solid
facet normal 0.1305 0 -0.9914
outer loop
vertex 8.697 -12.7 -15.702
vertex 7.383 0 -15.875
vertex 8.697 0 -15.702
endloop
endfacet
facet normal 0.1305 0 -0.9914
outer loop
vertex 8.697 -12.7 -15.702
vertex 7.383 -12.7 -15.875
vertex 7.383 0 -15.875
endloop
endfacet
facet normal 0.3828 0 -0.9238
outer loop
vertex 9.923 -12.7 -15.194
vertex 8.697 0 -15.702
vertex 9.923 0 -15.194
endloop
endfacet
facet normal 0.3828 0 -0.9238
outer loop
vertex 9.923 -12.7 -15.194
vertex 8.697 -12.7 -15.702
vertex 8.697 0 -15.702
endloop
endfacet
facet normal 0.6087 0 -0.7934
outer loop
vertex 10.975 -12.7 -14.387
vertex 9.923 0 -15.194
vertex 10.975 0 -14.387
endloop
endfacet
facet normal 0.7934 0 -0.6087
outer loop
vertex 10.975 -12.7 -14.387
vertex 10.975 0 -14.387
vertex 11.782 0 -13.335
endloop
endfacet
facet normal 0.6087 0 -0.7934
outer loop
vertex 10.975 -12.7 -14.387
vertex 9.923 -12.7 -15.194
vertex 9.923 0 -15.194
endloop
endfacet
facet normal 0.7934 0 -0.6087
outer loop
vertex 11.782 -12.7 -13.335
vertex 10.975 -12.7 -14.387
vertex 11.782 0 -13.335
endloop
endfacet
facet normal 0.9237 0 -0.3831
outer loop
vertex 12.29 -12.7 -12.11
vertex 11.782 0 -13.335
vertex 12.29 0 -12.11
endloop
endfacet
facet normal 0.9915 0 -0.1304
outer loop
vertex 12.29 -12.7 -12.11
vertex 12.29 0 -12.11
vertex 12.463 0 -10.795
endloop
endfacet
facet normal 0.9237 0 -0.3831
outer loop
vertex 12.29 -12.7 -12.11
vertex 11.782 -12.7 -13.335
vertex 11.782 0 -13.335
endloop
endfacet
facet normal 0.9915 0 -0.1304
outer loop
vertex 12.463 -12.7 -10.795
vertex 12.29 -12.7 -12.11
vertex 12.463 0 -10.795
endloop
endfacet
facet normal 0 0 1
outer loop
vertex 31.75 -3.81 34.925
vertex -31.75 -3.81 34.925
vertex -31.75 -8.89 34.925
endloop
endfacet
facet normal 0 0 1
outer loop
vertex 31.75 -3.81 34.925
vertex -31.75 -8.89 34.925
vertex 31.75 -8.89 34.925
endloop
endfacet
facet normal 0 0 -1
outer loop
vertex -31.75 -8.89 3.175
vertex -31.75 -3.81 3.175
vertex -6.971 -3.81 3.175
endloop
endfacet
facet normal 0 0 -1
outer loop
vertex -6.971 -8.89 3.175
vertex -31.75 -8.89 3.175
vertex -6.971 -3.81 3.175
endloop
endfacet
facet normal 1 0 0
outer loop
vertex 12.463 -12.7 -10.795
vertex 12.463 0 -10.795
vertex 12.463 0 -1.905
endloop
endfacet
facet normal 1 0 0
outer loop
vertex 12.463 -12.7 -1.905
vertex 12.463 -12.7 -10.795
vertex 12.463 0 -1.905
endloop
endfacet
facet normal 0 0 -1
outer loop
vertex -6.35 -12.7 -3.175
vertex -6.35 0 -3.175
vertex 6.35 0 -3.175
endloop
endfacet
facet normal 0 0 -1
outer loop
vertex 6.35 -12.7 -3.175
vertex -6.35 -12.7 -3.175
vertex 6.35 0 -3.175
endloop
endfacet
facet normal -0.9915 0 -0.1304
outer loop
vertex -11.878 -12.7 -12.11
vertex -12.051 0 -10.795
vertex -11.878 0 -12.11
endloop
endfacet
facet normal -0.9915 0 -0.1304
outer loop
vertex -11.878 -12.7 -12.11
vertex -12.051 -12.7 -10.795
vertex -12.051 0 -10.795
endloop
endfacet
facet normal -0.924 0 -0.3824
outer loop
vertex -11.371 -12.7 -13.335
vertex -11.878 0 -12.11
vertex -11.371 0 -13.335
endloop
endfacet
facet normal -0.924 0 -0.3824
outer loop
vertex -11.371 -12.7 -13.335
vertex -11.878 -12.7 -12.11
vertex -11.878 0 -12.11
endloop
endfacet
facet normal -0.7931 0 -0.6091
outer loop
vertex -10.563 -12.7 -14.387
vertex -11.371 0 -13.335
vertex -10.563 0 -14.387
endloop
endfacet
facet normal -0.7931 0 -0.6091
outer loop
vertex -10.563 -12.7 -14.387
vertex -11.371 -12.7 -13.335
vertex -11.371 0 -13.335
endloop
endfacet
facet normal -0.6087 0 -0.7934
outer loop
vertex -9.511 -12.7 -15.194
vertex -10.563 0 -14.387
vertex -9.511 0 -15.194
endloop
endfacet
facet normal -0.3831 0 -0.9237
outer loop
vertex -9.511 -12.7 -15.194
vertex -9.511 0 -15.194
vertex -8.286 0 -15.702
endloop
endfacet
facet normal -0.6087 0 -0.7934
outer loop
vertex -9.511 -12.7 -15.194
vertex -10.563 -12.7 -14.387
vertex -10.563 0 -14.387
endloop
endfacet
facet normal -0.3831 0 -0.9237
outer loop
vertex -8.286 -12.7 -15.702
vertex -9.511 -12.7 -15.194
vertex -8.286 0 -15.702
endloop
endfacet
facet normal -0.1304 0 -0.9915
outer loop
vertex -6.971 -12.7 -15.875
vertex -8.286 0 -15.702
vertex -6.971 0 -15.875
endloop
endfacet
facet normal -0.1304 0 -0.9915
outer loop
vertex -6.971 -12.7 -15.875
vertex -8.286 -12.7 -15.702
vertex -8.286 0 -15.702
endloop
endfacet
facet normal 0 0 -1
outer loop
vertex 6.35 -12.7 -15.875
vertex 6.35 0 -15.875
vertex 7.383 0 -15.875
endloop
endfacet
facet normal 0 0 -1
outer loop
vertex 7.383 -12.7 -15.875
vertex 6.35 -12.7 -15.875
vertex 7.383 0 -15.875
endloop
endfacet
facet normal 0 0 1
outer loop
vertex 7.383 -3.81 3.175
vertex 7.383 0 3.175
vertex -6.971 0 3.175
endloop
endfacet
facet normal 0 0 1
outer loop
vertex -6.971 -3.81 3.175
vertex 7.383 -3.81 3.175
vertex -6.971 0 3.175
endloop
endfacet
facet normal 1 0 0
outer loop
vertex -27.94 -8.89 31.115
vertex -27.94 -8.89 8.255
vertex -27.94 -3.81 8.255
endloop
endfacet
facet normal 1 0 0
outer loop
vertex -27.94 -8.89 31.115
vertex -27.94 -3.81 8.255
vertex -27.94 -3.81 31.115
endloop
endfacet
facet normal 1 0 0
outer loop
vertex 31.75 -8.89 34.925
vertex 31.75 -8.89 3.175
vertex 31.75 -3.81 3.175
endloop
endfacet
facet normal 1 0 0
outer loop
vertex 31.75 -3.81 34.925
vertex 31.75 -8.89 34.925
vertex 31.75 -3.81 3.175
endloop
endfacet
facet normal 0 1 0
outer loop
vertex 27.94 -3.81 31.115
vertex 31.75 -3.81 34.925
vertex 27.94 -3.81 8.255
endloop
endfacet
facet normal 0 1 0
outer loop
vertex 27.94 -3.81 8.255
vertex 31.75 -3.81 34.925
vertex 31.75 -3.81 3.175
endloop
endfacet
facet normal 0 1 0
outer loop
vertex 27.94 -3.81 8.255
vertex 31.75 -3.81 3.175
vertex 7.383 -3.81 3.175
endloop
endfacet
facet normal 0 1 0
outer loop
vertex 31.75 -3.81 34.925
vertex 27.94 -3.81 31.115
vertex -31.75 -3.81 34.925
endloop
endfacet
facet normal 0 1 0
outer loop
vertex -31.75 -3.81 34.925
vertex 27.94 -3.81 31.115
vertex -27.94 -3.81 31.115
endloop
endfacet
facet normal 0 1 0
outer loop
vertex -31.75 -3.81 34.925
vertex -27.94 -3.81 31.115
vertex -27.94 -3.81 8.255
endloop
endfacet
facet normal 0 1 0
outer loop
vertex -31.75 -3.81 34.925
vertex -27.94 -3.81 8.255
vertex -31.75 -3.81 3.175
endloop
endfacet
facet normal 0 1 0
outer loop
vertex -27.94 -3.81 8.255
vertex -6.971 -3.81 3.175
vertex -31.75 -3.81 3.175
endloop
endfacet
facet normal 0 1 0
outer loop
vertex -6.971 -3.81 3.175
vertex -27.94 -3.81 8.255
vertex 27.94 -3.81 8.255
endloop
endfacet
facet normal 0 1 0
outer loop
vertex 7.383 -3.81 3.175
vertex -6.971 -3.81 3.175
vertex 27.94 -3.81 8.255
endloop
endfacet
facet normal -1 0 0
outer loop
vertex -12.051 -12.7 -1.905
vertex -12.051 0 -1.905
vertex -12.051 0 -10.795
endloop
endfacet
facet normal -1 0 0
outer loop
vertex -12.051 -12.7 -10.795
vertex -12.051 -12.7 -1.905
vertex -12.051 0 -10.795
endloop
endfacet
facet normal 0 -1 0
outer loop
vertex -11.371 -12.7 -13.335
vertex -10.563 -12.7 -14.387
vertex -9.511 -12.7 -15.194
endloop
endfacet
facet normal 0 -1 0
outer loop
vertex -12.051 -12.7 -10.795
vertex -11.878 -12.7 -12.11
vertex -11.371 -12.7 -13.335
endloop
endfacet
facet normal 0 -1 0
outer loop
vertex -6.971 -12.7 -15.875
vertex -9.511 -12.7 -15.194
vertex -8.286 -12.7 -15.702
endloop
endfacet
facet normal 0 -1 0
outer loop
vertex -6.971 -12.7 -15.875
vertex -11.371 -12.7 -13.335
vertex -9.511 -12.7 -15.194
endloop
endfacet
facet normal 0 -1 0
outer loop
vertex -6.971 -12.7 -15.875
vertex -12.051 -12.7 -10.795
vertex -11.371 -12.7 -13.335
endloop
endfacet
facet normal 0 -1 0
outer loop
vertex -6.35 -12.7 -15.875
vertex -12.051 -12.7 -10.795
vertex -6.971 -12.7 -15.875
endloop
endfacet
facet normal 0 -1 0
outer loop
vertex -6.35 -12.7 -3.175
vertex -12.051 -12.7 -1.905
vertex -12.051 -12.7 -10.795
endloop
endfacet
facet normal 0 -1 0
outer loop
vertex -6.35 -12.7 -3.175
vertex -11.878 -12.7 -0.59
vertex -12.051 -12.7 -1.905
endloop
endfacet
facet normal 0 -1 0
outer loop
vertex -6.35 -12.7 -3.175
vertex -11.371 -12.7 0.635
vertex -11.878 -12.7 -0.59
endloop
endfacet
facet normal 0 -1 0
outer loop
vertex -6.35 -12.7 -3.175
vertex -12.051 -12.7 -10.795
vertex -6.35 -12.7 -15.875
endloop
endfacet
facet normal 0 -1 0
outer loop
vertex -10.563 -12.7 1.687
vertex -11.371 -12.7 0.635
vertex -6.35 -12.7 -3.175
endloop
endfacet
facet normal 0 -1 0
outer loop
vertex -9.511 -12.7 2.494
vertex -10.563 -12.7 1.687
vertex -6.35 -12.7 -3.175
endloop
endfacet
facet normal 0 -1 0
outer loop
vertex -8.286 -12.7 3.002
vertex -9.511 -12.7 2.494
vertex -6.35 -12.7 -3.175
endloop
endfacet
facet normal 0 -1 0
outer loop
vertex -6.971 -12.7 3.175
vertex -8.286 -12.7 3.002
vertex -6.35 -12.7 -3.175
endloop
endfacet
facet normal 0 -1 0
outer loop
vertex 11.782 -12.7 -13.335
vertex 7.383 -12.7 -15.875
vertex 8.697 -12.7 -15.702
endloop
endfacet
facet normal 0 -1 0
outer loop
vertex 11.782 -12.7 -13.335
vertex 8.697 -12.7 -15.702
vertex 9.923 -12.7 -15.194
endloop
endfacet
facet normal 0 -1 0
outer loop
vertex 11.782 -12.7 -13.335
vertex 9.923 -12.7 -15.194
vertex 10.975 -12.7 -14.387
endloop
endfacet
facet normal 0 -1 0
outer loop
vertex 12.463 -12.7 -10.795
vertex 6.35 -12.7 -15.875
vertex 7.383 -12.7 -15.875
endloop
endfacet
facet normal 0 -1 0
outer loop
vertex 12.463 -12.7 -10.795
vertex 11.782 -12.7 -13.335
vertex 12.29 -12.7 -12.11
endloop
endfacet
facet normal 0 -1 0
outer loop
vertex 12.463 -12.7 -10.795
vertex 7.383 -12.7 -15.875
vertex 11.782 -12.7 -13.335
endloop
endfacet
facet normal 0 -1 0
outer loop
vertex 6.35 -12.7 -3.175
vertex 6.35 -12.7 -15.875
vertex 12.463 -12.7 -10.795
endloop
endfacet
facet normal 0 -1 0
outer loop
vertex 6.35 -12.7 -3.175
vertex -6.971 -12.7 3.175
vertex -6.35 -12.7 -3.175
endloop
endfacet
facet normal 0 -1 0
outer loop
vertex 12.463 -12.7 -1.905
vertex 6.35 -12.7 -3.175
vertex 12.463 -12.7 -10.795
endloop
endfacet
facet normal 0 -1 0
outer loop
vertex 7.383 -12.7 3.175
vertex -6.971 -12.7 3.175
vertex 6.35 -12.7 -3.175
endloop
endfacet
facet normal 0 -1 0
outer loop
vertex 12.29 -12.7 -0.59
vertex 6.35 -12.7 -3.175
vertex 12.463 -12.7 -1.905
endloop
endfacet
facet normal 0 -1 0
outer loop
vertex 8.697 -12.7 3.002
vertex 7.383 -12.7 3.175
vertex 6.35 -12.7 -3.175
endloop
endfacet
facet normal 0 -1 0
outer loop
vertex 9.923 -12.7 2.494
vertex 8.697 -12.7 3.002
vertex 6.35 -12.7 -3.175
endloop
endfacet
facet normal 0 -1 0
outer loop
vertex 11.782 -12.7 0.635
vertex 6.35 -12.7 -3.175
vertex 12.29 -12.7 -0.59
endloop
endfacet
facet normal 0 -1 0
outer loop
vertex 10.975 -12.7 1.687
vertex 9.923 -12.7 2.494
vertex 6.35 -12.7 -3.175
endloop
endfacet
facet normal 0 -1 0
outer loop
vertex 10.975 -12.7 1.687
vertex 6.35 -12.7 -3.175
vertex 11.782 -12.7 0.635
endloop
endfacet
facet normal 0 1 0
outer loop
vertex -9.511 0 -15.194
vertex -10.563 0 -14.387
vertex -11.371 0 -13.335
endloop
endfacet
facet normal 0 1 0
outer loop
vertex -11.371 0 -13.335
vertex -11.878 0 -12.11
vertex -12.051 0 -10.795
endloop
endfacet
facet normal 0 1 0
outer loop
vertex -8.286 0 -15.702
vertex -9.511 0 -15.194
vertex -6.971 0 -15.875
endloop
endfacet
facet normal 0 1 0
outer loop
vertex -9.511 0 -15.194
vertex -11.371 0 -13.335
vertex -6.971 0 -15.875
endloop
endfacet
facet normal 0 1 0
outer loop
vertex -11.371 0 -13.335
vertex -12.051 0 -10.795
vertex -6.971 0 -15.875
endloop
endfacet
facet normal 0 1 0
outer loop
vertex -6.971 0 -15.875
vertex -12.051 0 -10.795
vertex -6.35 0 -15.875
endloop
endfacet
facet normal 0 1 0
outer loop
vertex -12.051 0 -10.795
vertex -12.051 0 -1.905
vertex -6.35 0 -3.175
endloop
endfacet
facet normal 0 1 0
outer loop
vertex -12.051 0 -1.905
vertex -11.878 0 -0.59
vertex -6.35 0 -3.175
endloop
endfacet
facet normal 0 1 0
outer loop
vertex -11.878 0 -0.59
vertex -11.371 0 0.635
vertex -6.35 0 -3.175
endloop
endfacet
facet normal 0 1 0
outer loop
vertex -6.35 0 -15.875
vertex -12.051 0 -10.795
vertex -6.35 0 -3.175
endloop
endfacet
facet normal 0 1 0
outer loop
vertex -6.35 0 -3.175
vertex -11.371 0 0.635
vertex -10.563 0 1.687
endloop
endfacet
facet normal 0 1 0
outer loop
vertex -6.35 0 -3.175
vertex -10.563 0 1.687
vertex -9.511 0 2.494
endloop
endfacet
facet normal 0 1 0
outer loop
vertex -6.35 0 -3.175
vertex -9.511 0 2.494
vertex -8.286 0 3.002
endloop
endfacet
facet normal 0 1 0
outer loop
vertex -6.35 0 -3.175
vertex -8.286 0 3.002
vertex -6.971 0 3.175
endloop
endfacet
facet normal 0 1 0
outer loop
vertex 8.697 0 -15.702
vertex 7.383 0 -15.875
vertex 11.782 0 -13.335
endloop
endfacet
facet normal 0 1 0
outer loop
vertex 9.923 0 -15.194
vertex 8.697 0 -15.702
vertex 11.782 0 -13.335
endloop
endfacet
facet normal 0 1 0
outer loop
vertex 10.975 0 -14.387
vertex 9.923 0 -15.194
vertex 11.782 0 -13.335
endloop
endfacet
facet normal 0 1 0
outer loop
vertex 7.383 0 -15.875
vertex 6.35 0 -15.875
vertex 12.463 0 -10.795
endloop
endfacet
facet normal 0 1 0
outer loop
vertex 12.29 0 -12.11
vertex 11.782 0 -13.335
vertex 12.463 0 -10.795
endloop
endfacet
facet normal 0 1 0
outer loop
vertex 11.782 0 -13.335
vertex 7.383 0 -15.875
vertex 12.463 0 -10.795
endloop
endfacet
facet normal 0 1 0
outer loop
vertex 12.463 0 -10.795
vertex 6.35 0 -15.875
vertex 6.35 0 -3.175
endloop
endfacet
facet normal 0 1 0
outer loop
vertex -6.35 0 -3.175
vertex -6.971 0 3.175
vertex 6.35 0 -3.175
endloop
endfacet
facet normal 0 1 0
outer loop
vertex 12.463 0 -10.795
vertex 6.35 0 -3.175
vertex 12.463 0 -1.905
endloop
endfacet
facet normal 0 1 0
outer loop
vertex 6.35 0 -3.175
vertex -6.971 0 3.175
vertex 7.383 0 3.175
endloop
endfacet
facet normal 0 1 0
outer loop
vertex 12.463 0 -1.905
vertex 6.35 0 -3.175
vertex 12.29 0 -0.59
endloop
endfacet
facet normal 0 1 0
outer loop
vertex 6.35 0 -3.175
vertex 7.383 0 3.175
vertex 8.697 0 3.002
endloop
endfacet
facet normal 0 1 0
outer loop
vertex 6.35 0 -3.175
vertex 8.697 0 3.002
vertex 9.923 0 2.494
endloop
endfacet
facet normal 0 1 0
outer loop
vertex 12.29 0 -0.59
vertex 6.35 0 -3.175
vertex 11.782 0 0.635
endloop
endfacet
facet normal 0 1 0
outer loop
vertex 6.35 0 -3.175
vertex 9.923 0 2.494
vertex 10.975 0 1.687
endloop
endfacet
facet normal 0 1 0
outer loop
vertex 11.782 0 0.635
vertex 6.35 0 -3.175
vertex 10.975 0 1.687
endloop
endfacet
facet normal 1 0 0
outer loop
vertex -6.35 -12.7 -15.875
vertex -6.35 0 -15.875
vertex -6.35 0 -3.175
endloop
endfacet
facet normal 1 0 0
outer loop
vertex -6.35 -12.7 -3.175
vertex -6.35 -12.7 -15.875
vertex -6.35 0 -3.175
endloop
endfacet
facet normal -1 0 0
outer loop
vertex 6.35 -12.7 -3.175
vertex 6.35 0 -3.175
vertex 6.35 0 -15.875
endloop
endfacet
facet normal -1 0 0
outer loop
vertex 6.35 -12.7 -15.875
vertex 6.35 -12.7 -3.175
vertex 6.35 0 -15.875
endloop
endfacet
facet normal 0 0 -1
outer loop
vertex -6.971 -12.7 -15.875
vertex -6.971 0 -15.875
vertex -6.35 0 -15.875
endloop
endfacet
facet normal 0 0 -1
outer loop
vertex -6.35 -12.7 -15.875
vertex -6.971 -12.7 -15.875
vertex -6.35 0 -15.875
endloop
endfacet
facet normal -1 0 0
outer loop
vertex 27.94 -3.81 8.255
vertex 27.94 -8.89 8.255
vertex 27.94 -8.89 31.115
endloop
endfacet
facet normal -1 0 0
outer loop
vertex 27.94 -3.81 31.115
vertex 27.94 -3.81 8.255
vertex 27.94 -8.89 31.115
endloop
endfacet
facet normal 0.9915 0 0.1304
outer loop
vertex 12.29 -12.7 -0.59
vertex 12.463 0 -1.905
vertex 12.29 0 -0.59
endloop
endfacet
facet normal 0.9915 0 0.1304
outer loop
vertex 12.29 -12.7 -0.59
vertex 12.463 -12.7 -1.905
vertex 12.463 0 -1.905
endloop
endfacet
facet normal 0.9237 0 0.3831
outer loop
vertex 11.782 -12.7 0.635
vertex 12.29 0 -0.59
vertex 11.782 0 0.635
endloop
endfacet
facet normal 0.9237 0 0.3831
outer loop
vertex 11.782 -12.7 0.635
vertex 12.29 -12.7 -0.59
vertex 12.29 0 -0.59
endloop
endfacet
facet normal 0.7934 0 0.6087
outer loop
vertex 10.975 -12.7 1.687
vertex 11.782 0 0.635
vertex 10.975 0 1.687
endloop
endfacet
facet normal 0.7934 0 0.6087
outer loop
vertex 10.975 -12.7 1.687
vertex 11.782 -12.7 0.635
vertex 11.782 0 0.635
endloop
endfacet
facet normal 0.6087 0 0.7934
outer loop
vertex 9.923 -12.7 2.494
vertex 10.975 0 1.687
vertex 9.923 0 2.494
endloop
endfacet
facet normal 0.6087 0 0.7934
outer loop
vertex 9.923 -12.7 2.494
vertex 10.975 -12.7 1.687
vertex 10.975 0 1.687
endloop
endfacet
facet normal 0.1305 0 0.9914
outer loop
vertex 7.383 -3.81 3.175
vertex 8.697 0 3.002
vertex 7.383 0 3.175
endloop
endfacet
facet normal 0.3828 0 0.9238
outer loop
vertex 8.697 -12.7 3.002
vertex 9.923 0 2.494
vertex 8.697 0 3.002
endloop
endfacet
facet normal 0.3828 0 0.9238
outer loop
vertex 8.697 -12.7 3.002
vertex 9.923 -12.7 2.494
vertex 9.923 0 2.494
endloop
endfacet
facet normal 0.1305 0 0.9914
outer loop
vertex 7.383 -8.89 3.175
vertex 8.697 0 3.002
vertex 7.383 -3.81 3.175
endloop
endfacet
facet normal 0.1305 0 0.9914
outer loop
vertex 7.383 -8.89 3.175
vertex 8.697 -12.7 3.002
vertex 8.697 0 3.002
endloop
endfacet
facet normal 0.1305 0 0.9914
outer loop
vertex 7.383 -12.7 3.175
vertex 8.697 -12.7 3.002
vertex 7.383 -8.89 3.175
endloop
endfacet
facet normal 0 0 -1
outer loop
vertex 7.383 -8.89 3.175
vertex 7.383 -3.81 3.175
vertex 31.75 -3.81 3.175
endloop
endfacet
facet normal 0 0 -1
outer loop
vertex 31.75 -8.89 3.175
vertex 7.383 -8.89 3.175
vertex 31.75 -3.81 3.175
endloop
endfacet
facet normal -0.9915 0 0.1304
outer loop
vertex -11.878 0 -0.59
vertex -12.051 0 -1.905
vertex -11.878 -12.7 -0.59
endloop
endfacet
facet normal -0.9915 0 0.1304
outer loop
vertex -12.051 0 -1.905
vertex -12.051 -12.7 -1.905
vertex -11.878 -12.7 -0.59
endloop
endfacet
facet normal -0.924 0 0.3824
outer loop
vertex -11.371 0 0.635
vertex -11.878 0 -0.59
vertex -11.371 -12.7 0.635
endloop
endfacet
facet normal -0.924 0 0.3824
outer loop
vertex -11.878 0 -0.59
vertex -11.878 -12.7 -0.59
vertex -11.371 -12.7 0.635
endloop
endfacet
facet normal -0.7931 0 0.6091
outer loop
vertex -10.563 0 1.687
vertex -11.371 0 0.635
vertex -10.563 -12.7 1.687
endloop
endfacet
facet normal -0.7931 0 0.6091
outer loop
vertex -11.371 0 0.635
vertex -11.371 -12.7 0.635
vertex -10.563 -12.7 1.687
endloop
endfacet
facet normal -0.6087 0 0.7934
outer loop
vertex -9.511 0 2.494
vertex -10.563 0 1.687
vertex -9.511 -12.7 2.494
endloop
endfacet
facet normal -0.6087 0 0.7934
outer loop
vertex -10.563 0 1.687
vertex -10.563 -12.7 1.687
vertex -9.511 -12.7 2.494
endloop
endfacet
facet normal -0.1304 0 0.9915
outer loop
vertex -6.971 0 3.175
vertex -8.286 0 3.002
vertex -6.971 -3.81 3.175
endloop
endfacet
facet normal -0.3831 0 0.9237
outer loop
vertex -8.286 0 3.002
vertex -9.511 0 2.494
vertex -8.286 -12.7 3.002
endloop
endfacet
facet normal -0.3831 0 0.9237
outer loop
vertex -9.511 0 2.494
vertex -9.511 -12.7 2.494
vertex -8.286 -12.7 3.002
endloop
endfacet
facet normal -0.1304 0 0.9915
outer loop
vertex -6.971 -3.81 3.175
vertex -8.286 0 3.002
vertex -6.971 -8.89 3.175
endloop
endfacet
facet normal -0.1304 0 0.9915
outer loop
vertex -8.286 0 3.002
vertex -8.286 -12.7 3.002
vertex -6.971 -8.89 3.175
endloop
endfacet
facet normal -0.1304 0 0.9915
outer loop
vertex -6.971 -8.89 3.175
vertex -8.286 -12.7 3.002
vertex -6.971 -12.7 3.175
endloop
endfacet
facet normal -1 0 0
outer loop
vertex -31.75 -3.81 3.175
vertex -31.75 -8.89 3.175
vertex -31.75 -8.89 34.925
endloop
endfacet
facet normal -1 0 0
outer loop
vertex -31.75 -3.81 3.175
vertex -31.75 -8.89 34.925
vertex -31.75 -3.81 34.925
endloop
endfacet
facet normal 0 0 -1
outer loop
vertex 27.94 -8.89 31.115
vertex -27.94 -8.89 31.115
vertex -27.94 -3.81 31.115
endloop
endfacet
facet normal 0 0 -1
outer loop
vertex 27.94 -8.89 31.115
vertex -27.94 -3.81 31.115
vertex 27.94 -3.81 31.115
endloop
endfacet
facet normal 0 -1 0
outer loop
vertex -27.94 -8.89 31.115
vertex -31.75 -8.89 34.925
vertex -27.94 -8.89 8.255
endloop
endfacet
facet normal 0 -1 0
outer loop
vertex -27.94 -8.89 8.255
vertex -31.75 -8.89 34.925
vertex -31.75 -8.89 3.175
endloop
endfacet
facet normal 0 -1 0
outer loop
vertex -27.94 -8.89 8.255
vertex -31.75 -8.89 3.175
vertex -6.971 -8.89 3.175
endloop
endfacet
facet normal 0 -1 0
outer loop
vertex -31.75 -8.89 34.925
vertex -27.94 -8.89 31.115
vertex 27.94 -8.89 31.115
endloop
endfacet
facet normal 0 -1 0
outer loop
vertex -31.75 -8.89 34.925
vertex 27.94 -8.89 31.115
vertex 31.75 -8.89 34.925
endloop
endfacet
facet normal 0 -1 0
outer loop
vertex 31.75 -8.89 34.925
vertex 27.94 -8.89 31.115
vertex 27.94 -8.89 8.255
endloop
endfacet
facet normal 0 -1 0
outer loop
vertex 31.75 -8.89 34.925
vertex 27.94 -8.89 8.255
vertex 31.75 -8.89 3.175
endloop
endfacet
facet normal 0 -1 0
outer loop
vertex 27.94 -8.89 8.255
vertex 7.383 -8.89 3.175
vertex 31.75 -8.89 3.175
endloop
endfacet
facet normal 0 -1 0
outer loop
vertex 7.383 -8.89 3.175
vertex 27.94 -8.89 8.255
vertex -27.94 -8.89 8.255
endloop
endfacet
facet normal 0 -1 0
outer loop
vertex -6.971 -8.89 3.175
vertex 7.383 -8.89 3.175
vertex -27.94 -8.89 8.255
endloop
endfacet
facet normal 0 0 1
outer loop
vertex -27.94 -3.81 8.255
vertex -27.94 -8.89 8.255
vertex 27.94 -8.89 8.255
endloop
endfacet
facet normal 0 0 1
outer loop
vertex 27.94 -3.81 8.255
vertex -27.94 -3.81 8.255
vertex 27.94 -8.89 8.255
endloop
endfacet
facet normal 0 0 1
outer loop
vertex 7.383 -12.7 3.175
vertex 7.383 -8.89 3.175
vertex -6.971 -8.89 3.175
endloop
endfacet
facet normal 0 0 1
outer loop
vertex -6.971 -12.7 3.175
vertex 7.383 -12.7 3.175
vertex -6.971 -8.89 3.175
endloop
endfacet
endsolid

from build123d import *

# Parameters (mm, degrees)
F0_W     = 12.7
F0_H     = 6.35
F1_DEPTH = 12.7
F2_R     = 5.08
F3_W     = 24.7787790167
F3_H     = 5.08
F3_W_2   = 24.3673952091
F3_W_3   = 14.3538257742
F4_DEPTH = 31.75
F5_W     = 55.88
F5_H     = 22.86
F6_DEPTH = 25.4


with BuildPart() as f1:
    # F0 (on Front) → F1 (new body)
    with BuildSketch(Plane.XZ):
        Polygon((-6.35, -3.175), (-6.35, 3.175), (-12.0512209833, 3.175), (-12.0512209833, -15.875), (-6.35, -15.875), align=None)
        Rectangle(F0_W, F0_H)
        Polygon((12.4626047909, 3.175), (6.35, 3.175), (6.35, -3.175), (6.35, -15.875), (12.4626047909, -15.875), align=None)
    extrude(amount=F1_DEPTH)

    # F2
    f2_edges = [f1.edges().sort_by_distance(p)[0] for p in [
        (-12.051221, -6.35, 3.175),
        (12.462605, -6.35, 3.175),
        (-12.051221, -6.35, -15.875),
        (12.462605, -6.35, -15.875),
    ]]
    fillet(f2_edges, radius=F2_R)

    # F3 (on face) → F4 (join)
    with BuildSketch(Plane.XY.offset(3.175)):
        with Locations((-19.3606104916, -6.35)):
            Rectangle(F3_W, F3_H)
        with Locations((19.5663023955, -6.35)):
            Rectangle(F3_W_2, F3_H)
        with Locations((0.2056919038, -6.35)):
            Rectangle(F3_W_3, F3_H)
    extrude(amount=F4_DEPTH)

    # F5 (on face) → F6 (cut)
    with BuildSketch(Plane.XZ.offset(8.89)):
        with Locations((0, 19.685)):
            Rectangle(F5_W, F5_H)
    extrude(amount=-F6_DEPTH, mode=Mode.SUBTRACT)


solid = f1.part
